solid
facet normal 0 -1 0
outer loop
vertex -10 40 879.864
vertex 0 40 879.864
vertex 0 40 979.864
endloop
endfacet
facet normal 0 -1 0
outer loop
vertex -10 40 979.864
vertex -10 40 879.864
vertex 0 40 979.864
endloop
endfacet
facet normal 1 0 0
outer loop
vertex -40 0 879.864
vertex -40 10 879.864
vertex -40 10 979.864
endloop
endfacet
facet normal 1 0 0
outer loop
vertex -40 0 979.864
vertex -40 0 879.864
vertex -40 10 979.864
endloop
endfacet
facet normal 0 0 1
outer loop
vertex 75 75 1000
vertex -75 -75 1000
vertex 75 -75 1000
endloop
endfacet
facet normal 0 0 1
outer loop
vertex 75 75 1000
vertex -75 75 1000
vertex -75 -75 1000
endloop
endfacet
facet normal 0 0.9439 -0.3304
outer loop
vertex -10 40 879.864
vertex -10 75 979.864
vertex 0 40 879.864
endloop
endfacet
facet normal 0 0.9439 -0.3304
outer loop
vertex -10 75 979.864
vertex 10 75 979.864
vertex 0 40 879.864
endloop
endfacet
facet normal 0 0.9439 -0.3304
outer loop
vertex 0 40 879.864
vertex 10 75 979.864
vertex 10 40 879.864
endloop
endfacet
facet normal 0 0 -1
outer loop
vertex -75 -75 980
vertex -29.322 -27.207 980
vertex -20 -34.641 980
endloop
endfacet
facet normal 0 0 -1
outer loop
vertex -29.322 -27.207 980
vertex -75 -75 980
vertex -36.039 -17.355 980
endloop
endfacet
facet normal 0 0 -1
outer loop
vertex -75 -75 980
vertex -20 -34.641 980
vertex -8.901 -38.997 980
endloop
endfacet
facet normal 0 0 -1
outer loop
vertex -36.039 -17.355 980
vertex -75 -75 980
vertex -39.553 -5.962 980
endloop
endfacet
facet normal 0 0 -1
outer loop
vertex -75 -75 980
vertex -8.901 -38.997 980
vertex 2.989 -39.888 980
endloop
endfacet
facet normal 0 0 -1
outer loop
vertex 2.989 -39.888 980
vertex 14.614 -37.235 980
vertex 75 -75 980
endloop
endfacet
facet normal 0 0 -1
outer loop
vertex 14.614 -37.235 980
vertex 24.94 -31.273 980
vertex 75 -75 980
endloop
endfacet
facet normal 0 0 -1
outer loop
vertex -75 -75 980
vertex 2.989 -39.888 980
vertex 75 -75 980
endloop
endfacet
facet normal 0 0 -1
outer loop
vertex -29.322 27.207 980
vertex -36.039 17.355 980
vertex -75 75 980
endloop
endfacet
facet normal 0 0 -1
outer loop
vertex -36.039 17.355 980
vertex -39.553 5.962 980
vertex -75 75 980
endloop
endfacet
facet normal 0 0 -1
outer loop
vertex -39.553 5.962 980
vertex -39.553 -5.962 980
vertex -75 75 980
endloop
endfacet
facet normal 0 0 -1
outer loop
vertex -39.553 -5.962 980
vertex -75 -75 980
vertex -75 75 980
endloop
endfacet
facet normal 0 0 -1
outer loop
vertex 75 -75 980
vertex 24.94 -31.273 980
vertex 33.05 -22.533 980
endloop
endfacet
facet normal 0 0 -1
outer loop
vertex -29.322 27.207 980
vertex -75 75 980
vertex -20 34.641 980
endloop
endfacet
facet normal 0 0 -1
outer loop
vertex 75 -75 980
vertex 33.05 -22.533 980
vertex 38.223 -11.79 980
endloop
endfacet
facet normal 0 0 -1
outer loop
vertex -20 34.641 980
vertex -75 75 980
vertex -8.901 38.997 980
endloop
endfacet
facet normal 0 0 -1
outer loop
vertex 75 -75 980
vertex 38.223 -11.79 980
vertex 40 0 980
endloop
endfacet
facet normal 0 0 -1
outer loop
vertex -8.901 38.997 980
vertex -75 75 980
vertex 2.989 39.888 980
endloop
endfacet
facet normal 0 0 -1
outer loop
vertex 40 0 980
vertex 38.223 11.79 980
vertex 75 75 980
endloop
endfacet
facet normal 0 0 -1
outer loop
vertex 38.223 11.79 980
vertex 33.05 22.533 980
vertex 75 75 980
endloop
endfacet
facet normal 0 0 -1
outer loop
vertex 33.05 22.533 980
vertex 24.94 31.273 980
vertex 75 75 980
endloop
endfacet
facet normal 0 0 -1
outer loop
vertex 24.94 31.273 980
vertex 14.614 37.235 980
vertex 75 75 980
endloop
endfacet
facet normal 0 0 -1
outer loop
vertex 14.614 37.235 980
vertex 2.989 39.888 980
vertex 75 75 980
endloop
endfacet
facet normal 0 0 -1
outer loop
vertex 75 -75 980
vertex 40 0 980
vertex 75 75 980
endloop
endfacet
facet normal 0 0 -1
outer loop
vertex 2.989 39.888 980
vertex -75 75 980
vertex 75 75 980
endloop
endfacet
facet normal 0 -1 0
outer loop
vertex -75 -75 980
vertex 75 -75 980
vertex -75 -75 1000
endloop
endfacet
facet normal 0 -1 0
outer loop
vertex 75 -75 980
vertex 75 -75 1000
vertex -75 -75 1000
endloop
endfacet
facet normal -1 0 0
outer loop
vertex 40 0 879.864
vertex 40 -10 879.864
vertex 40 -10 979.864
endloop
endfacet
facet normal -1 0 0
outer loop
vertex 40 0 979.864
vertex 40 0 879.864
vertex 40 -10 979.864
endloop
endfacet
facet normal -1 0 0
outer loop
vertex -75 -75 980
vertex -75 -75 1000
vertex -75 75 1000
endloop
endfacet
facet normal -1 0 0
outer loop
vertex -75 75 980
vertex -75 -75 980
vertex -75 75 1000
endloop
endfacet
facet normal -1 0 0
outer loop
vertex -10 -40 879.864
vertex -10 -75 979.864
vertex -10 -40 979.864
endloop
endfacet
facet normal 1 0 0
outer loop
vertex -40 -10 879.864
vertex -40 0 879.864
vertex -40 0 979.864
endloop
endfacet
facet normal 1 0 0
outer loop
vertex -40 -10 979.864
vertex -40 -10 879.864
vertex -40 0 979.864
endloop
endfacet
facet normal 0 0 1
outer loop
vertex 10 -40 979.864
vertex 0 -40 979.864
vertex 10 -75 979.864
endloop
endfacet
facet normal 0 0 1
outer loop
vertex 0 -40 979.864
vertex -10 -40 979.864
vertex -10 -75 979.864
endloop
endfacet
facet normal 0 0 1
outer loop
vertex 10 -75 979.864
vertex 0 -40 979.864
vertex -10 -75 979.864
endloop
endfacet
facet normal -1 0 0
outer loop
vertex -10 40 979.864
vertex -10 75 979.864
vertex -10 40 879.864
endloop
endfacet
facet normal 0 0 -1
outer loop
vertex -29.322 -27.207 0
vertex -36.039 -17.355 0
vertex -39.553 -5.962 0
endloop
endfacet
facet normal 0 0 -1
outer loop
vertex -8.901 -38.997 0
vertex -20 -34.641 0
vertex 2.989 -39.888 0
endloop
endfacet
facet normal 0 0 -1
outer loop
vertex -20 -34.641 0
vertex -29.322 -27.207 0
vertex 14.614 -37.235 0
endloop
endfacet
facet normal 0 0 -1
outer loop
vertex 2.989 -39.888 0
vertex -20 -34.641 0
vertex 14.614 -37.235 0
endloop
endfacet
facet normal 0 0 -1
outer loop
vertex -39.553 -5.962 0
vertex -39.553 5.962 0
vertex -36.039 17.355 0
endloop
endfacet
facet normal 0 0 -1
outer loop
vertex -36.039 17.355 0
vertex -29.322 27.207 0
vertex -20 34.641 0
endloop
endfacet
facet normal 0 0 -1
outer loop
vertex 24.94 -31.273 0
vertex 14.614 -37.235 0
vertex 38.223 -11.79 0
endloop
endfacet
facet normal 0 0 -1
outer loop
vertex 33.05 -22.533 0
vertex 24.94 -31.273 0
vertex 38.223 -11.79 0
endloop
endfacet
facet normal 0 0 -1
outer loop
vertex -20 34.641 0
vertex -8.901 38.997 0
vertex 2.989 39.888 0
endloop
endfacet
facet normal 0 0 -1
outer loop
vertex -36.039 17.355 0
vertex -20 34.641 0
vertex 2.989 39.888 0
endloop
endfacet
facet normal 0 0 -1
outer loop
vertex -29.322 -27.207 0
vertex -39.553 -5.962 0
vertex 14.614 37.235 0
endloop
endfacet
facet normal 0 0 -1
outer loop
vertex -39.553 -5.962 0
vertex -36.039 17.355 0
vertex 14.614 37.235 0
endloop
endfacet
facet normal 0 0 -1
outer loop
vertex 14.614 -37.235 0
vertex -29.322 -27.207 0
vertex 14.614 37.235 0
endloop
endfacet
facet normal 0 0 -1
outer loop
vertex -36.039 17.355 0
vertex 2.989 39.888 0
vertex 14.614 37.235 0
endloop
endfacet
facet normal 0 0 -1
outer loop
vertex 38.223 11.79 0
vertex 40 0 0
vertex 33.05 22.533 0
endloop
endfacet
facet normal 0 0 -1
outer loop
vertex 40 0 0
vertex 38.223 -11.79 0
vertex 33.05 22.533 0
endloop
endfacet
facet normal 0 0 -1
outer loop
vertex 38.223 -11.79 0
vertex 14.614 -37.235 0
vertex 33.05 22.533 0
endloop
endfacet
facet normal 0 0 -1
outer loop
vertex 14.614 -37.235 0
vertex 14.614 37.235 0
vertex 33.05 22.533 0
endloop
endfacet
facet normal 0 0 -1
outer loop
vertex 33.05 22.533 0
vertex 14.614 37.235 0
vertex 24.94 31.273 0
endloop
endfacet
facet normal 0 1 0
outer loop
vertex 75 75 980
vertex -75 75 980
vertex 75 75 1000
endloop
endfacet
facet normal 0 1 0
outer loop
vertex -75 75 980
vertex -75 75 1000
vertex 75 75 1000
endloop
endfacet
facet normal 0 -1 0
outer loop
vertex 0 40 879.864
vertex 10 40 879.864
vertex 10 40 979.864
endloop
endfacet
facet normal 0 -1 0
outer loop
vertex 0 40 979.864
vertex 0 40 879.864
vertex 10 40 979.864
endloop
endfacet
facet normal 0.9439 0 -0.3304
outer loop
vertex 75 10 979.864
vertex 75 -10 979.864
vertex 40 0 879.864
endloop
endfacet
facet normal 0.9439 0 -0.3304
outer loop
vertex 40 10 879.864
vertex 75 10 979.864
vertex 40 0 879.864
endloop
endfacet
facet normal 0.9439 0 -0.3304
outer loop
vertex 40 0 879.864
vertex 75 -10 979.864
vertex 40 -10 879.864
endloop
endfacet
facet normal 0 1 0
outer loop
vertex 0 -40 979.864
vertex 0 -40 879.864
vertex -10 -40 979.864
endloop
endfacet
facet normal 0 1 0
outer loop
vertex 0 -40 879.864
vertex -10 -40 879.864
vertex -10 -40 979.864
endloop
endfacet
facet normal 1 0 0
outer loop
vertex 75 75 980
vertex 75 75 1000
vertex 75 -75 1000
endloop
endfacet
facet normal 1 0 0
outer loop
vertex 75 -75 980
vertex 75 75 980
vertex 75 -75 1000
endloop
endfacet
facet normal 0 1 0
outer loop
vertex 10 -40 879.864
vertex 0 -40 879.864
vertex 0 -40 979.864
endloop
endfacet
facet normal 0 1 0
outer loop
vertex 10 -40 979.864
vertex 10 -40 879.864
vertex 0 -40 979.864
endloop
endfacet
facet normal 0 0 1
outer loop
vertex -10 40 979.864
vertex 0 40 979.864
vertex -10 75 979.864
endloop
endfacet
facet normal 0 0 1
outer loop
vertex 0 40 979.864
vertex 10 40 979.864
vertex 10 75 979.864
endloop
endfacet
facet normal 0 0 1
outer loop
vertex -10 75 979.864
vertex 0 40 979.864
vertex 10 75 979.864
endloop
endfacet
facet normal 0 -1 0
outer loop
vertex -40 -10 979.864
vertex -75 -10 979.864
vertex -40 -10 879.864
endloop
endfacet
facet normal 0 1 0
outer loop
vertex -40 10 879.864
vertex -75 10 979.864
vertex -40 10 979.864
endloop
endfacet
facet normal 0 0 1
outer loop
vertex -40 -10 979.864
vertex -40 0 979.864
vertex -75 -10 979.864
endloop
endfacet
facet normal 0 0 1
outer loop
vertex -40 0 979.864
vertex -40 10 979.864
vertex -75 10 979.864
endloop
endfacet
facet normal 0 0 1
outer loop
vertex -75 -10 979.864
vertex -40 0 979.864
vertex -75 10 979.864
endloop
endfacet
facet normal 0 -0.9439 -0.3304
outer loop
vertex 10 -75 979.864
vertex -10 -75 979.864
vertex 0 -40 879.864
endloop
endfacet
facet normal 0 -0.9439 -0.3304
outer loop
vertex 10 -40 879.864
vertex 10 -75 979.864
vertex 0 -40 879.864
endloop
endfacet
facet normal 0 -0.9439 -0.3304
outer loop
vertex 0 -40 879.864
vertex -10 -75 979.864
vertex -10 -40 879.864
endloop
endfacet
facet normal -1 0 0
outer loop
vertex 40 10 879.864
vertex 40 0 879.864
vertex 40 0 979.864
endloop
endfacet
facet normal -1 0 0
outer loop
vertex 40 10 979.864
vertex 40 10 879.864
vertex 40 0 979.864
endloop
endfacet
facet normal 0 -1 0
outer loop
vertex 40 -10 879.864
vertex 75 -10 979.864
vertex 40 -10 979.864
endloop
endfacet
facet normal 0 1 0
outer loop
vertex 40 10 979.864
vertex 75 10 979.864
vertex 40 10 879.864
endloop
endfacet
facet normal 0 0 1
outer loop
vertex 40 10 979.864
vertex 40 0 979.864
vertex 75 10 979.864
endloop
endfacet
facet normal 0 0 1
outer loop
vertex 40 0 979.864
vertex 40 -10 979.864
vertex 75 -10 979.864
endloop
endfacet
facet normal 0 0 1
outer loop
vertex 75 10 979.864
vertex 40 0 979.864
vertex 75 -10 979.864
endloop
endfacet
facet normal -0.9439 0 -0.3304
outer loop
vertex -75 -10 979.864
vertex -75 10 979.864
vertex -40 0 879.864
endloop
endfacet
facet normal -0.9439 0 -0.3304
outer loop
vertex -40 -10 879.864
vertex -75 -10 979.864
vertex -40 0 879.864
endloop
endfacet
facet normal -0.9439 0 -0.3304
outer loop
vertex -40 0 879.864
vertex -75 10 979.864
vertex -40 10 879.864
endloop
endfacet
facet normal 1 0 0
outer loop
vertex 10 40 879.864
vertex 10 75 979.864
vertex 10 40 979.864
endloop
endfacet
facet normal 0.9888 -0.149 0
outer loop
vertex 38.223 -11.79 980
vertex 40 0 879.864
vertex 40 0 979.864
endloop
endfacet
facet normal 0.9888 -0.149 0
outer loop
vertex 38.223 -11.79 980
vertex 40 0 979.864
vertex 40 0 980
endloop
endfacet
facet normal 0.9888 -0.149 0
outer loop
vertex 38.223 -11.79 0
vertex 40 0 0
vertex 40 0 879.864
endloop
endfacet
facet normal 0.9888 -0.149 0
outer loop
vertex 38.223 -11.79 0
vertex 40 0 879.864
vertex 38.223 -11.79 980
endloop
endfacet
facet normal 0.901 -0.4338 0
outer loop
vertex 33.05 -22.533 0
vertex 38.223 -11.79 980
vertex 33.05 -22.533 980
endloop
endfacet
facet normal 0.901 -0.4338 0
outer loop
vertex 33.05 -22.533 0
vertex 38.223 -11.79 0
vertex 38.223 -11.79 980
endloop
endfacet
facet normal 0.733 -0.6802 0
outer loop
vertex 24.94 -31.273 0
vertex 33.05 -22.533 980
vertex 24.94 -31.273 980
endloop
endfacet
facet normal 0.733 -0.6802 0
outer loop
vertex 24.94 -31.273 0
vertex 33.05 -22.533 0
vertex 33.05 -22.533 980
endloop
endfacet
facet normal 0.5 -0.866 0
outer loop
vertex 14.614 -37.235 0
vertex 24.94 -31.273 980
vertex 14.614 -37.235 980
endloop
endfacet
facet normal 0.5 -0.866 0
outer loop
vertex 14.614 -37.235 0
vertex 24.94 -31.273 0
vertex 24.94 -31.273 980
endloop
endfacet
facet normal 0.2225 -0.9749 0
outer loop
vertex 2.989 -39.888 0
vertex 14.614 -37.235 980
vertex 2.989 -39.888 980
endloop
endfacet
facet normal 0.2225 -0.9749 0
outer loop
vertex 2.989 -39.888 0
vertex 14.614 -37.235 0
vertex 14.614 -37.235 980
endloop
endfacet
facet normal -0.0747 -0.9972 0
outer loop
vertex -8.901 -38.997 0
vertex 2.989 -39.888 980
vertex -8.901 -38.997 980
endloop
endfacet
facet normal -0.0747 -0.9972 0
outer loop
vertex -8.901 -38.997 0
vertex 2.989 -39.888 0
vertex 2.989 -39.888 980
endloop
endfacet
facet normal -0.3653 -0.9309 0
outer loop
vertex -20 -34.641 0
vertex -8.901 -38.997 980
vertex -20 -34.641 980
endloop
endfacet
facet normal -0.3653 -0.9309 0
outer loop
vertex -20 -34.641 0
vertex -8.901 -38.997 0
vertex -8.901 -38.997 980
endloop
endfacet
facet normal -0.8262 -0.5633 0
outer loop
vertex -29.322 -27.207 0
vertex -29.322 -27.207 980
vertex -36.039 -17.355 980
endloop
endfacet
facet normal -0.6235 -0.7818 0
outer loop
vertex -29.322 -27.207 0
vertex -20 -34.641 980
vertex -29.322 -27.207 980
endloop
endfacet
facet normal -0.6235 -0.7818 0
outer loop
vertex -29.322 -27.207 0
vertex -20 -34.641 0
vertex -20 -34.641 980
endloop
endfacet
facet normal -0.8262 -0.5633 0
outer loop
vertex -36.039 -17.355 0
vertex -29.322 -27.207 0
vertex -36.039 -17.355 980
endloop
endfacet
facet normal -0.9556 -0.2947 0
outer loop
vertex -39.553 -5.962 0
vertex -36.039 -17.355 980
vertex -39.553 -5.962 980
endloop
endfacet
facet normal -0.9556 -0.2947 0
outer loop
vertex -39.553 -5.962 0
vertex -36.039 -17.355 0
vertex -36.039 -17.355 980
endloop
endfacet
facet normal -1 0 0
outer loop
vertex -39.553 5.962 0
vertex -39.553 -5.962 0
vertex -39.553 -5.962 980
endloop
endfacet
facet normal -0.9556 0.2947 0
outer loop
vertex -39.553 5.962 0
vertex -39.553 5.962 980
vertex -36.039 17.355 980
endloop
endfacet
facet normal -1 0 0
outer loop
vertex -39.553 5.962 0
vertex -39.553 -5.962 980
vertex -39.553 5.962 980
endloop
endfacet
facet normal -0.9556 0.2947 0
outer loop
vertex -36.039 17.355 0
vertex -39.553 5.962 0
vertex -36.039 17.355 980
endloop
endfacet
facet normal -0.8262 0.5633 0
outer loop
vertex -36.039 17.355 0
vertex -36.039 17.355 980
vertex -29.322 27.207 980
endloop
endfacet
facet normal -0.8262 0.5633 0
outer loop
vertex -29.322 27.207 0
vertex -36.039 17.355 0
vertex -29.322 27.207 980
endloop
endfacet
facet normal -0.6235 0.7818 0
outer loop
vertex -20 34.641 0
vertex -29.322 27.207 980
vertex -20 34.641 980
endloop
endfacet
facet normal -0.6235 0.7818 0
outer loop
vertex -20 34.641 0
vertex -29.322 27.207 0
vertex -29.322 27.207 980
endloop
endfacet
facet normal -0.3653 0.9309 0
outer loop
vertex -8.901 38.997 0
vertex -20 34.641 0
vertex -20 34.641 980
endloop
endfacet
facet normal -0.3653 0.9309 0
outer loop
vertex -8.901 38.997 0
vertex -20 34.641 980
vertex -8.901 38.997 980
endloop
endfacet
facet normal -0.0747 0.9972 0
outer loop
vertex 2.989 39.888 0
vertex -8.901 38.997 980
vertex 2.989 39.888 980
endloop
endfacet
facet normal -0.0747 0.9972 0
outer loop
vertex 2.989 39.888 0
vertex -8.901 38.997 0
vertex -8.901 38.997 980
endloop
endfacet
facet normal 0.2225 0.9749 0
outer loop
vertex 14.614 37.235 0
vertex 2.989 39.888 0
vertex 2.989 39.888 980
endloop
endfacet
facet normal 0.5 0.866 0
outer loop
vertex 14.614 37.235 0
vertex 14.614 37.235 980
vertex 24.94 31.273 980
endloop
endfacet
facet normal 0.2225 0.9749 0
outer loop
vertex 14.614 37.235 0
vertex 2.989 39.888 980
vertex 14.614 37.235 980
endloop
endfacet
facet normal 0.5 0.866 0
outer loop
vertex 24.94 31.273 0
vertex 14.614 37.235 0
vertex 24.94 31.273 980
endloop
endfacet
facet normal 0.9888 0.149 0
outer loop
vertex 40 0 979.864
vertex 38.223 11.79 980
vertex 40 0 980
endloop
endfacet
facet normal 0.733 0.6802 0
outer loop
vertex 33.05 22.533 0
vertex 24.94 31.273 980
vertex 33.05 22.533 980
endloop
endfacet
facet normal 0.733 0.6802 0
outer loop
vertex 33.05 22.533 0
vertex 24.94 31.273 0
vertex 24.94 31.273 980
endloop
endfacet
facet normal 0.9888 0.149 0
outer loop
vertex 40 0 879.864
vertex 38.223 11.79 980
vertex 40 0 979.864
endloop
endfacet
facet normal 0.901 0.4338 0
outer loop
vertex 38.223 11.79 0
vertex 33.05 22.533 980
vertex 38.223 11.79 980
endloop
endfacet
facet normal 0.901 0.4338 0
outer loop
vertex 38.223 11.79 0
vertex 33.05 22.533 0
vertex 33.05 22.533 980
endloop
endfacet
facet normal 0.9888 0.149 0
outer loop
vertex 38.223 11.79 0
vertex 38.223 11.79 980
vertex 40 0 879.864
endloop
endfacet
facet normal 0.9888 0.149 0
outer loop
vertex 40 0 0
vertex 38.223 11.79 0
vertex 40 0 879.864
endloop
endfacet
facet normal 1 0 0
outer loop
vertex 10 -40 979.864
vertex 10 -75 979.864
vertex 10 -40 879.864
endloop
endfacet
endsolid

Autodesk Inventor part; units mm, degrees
ref_plane "YZ Plane" through (0, 0, 0) normal (1, 0, 0) x (0, 1, 0)
ref_plane "XZ Plane" through (0, 0, 0) normal (0, 1, 0) x (-1, 0, 0)
ref_plane "XY Plane" through (0, 0, 0) normal (0, 0, 1) x (1, 0, 0)
sketch "Sketch1" plane through (0, 0, 0) normal (0, 0, 1) x (1, 0, 0)
  circle A0 centre (0, 0) radius 40
  dimension "d0" = 80
extrude "Extrusion1" add sketch "Sketch1" along normal blind 1000
sketch "Sketch2" plane through (0, 0, 0) normal (0, 1, 0) x (-1, 0, 0)
  point P0 (0, 0)
sketch "Sketch3" plane through (0, 0, 1000) normal (0, 0, 1) x (1, 0, 0)
  circle A0 centre (0, 0) radius 40 projected
  line L0 (-75, 75) -> (75, 75)
  line L1 (75, 75) -> (75, -75)
  line L2 (75, -75) -> (-75, -75)
  line L3 (-75, -75) -> (-75, 75)
  line L4 (-75, 75) -> (75, -75) construction
  line L5 (75, 75) -> (-75, -75) construction
  dimension "d3" = 150
  dimension "d4" = 150
extrude "Extrusion2" add sketch "Sketch3" against normal blind 20
sketch "Sketch5" plane through (0, 0, 0) normal (0, 1, 0) x (-1, 0, 0)
  line L0 (0, 1000.0314) -> (-40, 1000.0314)
  line L1 (-40, 1000.0314) -> (-40, 979.864)
  line L2 (-40, 979.864) -> (-75, 979.864)
  line L3 (-75, 979.864) -> (-40, 879.864)
  line L4 (-40, 879.864) -> (-40, 979.864)
  point P0 (0, 0)
  dimension "d13" = 40
  dimension "d14" = 35
  dimension "d15" = 100
extrude "Extrusion3" add sketch "Sketch5" along normal mid plane 20
pattern_circular "Circular Pattern1" count 4 over 360 about axis through (0, 0, 0) along (0, 0, 1) of "Extrusion3"
properties part number "badan 2"
